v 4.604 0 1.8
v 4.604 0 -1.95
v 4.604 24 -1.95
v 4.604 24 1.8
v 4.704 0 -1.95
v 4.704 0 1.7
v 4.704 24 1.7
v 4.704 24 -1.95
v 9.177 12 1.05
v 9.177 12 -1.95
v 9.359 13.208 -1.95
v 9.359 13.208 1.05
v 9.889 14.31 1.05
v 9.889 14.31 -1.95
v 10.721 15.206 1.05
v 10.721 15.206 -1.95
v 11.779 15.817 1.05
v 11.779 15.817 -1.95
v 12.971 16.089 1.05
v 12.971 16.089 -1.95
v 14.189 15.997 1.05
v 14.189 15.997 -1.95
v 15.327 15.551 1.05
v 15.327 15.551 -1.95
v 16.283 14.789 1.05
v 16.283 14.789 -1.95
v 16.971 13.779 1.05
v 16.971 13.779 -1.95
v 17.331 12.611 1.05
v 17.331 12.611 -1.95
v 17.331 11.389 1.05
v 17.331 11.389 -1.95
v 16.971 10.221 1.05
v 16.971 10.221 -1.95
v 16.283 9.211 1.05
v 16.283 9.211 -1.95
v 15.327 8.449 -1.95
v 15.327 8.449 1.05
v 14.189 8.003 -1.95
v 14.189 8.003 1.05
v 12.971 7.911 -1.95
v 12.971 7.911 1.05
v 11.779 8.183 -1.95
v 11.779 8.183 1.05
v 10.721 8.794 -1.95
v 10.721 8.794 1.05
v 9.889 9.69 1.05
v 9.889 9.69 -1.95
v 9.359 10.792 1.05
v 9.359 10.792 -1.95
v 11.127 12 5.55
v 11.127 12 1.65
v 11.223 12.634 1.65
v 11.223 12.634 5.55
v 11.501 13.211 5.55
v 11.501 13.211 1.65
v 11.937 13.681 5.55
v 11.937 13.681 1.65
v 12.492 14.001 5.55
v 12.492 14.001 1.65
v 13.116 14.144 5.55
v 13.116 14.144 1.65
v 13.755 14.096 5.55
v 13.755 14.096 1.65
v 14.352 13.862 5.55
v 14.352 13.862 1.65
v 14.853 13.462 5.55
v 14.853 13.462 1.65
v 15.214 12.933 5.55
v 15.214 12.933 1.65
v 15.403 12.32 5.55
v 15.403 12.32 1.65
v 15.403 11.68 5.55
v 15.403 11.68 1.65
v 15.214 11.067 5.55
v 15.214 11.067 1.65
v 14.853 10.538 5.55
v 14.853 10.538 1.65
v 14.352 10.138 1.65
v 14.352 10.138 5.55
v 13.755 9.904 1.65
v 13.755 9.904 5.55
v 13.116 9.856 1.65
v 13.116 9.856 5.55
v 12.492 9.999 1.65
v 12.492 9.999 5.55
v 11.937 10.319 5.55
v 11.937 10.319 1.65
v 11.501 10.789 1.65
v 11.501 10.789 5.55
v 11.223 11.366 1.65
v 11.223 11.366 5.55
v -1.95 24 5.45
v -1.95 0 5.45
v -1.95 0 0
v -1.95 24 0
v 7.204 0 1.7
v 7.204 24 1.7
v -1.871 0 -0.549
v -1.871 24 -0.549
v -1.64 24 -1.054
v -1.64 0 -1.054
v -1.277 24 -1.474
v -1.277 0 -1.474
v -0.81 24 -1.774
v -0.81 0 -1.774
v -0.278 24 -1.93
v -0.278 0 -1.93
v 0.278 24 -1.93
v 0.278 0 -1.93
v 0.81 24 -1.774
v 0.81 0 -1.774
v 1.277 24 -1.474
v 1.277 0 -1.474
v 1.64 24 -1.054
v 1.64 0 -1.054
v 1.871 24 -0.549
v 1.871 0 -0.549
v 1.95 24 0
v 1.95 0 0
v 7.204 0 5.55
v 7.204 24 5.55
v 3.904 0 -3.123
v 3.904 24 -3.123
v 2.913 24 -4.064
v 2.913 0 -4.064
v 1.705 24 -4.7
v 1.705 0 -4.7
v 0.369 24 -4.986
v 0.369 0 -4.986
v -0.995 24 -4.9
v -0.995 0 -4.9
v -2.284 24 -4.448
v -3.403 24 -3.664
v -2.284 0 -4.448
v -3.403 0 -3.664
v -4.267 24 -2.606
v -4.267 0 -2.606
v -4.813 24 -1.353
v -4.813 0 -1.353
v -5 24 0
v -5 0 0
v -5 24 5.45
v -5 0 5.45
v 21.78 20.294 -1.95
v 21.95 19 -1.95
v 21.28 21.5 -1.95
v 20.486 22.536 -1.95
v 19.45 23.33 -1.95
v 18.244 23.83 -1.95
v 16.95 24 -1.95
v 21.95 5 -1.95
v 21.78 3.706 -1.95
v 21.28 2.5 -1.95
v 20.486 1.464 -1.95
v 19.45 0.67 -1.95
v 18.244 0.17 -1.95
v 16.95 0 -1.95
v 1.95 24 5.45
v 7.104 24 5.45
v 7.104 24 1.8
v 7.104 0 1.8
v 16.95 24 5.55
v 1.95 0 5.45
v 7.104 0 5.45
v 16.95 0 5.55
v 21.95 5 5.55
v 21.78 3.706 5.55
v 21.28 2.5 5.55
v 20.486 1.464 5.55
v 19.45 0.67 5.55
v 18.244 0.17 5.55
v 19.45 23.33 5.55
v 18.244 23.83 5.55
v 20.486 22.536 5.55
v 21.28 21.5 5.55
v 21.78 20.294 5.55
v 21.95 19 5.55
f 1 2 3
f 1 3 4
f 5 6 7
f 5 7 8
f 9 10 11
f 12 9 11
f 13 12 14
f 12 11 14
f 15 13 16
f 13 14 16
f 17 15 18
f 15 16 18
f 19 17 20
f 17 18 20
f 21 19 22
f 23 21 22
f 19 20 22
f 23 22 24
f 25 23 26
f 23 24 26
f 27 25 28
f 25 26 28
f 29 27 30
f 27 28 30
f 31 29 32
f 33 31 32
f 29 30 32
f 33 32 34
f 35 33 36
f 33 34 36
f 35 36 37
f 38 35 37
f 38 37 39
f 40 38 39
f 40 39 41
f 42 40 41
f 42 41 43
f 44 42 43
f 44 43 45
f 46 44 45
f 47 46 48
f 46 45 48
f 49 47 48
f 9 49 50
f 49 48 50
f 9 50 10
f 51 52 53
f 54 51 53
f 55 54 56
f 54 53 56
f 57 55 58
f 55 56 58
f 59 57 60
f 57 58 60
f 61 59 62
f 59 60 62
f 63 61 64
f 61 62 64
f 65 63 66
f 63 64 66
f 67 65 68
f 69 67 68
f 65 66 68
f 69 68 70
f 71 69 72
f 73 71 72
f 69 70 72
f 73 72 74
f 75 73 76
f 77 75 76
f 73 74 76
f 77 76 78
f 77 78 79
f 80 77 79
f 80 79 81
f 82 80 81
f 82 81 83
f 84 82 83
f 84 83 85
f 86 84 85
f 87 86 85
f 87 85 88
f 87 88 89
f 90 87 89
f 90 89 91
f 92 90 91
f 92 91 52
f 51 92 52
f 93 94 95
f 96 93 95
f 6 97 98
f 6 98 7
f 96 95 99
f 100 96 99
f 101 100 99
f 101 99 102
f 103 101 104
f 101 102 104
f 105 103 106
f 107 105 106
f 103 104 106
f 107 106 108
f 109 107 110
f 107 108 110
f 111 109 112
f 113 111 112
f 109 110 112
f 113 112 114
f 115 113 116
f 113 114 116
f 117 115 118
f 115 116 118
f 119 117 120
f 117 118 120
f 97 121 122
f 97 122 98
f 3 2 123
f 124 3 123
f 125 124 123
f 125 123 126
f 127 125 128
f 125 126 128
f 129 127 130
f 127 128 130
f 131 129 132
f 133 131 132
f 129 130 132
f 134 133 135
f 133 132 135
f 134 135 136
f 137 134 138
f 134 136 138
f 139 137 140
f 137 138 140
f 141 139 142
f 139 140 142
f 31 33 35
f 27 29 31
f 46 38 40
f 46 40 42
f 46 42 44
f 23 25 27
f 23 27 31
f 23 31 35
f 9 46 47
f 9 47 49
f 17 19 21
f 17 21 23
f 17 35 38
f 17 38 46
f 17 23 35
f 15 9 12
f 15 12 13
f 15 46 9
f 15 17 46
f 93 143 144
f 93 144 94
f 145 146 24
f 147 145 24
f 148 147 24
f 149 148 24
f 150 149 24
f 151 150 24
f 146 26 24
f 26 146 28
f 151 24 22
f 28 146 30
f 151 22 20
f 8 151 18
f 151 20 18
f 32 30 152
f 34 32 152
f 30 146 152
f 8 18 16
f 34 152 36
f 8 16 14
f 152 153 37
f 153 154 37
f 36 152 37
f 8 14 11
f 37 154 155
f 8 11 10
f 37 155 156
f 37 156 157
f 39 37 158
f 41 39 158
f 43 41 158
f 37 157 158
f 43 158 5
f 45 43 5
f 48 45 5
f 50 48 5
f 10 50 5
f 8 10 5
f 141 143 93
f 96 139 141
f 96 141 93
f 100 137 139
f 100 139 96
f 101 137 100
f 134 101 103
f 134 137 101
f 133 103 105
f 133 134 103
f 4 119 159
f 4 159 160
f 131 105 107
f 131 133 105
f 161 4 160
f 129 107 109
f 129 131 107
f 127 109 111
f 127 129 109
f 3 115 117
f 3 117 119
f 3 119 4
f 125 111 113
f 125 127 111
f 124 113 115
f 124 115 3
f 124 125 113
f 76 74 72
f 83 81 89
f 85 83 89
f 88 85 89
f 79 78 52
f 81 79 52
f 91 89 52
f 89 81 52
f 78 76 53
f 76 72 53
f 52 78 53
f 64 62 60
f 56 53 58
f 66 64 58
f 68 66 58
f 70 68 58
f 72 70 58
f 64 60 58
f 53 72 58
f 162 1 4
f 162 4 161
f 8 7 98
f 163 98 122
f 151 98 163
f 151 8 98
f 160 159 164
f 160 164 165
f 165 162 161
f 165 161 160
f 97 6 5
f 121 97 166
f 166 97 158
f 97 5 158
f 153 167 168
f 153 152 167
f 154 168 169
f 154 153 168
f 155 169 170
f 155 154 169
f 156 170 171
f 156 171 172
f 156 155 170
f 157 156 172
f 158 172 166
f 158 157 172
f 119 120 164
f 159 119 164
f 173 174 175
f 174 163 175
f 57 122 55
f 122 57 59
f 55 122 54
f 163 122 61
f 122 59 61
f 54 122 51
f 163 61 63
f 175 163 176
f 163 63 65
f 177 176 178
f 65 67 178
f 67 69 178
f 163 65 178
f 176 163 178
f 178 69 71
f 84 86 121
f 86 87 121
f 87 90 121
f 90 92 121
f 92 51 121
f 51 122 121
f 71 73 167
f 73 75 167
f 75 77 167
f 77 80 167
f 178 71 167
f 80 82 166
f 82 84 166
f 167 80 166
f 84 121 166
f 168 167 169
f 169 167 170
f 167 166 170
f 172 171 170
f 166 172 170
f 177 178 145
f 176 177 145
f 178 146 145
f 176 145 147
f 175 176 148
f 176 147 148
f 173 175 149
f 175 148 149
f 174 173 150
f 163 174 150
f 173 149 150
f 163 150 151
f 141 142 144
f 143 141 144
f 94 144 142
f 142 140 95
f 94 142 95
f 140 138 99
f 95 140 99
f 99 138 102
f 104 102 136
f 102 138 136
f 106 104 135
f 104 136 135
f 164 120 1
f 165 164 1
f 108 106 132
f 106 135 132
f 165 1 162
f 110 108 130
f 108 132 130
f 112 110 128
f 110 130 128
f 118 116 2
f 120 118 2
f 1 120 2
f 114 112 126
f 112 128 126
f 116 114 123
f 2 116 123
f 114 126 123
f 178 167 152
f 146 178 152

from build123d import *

# Parameters (mm, degrees)
BOSS_EXTRUDE3_DEPTH = 24
FILLET1_R           = 5
SKETCH10_R          = 4.1
CUT_EXTRUDE3_DEPTH  = 3
SKETCH11_R          = 2.15
CUT_EXTRUDE4_DEPTH  = 34.081792575
CUT_EXTRUDE5_DEPTH  = 33.994014609
SKETCH14_W          = 5.154074283
SKETCH14_H          = 24
SKETCH14_W_2        = 3.05
CUT_EXTRUDE6_DEPTH  = 0.1
SKETCH15_R          = 2.15
BOSS_EXTRUDE4_DEPTH = 0.6


with BuildPart() as part:
    # Sketch4 → Boss-Extrude3 (new body)
    with BuildSketch(Plane(origin=(0, 0, 0), x_dir=(1, 0, 0), z_dir=(0, 1, 0))):
        with BuildLine():
            Line((21.95, 0), (21.95, 1.95))
            Line((21.95, 1.95), (4.604074283, 1.95))
            ThreePointArc((4.604074283, 1.95), (-0.994894112, 4.90001895), (-5, 0))
            Line((-5, 0), (-5, -5.55))
            Line((-5, -5.55), (-1.95, -5.55))
            Line((-1.95, -5.55), (-1.95, 0))
            ThreePointArc((-1.95, 0), (0, 1.95), (1.95, 0))
            Line((1.95, 0), (1.95, -5.55))
            Line((1.95, -5.55), (21.95, -5.55))
            Line((21.95, -5.55), (21.95, 0))
        make_face()
    extrude(amount=BOSS_EXTRUDE3_DEPTH)

    # Fillet1
    fillet1_edges = [part.edges().sort_by_distance(p)[0] for p in [
        (21.95, 0, 1.8),
        (21.95, 24, 1.8),
    ]]
    fillet(fillet1_edges, radius=FILLET1_R)

    # Sketch10 → Cut-Extrude3 (cut)
    with BuildSketch(Plane(origin=(0, 0, -1.95), x_dir=(-1, 0, 0), z_dir=(0, 0, -1))):
        with Locations((-13.277037141, 12)):
            Circle(SKETCH10_R)
    extrude(amount=-CUT_EXTRUDE3_DEPTH, mode=Mode.SUBTRACT)

    # Sketch11 → Cut-Extrude4 (cut, through all)
    with BuildSketch(Plane(origin=(0, 0, 1.05), x_dir=(-1, 0, 0), z_dir=(0, 0, -1))):
        with Locations((-13.277037141, 12)):
            Circle(SKETCH11_R)
    extrude(amount=-CUT_EXTRUDE4_DEPTH, mode=Mode.SUBTRACT)

    # Sketch13 → Cut-Extrude5 (cut, through all)
    with BuildSketch(Plane.XZ):
        Polygon((4.604074283, -1.95), (4.604074283, 1.8), (7.104074283, 1.8), (7.104074283, 5.55), (7.204074283, 5.55), (7.204074283, 1.7), (4.704074283, 1.7), (4.704074283, -1.95), align=None)
    extrude(amount=-CUT_EXTRUDE5_DEPTH, mode=Mode.SUBTRACT)


with BuildPart() as cut_extrude5_piece_1:
    # of the separate pieces the step leaves, piece 1, a body of its own (cut_extrude5_pieces)
    add(part.part.solids().sort_by_distance((21.95, 5, -1.95))[0])

    # Sketch15 → Boss-Extrude4 (add)
    with BuildSketch(Plane(origin=(0, 0, 1.05), x_dir=(-1, 0, 0), z_dir=(0, 0, -1))):
        with Locations((-13.277037141, 12)):
            Circle(SKETCH15_R)
    extrude(amount=-BOSS_EXTRUDE4_DEPTH)


with BuildPart() as cut_extrude5_piece_2:
    # of the separate pieces the step leaves, piece 2, a body of its own (cut_extrude5_pieces)
    add(part.part.solids().sort_by_distance((4.604074283, 0, -1.95))[0])

    # Sketch14 → Cut-Extrude6 (cut)
    with BuildSketch(Plane.XY.offset(5.55)):
        with Locations((4.527037142, 12)):
            Rectangle(SKETCH14_W, SKETCH14_H)
        with Locations((-3.475, 12)):
            Rectangle(SKETCH14_W_2, SKETCH14_H)
    extrude(amount=-CUT_EXTRUDE6_DEPTH, mode=Mode.SUBTRACT)


solid = Compound([cut_extrude5_piece_1.part, cut_extrude5_piece_2.part])
